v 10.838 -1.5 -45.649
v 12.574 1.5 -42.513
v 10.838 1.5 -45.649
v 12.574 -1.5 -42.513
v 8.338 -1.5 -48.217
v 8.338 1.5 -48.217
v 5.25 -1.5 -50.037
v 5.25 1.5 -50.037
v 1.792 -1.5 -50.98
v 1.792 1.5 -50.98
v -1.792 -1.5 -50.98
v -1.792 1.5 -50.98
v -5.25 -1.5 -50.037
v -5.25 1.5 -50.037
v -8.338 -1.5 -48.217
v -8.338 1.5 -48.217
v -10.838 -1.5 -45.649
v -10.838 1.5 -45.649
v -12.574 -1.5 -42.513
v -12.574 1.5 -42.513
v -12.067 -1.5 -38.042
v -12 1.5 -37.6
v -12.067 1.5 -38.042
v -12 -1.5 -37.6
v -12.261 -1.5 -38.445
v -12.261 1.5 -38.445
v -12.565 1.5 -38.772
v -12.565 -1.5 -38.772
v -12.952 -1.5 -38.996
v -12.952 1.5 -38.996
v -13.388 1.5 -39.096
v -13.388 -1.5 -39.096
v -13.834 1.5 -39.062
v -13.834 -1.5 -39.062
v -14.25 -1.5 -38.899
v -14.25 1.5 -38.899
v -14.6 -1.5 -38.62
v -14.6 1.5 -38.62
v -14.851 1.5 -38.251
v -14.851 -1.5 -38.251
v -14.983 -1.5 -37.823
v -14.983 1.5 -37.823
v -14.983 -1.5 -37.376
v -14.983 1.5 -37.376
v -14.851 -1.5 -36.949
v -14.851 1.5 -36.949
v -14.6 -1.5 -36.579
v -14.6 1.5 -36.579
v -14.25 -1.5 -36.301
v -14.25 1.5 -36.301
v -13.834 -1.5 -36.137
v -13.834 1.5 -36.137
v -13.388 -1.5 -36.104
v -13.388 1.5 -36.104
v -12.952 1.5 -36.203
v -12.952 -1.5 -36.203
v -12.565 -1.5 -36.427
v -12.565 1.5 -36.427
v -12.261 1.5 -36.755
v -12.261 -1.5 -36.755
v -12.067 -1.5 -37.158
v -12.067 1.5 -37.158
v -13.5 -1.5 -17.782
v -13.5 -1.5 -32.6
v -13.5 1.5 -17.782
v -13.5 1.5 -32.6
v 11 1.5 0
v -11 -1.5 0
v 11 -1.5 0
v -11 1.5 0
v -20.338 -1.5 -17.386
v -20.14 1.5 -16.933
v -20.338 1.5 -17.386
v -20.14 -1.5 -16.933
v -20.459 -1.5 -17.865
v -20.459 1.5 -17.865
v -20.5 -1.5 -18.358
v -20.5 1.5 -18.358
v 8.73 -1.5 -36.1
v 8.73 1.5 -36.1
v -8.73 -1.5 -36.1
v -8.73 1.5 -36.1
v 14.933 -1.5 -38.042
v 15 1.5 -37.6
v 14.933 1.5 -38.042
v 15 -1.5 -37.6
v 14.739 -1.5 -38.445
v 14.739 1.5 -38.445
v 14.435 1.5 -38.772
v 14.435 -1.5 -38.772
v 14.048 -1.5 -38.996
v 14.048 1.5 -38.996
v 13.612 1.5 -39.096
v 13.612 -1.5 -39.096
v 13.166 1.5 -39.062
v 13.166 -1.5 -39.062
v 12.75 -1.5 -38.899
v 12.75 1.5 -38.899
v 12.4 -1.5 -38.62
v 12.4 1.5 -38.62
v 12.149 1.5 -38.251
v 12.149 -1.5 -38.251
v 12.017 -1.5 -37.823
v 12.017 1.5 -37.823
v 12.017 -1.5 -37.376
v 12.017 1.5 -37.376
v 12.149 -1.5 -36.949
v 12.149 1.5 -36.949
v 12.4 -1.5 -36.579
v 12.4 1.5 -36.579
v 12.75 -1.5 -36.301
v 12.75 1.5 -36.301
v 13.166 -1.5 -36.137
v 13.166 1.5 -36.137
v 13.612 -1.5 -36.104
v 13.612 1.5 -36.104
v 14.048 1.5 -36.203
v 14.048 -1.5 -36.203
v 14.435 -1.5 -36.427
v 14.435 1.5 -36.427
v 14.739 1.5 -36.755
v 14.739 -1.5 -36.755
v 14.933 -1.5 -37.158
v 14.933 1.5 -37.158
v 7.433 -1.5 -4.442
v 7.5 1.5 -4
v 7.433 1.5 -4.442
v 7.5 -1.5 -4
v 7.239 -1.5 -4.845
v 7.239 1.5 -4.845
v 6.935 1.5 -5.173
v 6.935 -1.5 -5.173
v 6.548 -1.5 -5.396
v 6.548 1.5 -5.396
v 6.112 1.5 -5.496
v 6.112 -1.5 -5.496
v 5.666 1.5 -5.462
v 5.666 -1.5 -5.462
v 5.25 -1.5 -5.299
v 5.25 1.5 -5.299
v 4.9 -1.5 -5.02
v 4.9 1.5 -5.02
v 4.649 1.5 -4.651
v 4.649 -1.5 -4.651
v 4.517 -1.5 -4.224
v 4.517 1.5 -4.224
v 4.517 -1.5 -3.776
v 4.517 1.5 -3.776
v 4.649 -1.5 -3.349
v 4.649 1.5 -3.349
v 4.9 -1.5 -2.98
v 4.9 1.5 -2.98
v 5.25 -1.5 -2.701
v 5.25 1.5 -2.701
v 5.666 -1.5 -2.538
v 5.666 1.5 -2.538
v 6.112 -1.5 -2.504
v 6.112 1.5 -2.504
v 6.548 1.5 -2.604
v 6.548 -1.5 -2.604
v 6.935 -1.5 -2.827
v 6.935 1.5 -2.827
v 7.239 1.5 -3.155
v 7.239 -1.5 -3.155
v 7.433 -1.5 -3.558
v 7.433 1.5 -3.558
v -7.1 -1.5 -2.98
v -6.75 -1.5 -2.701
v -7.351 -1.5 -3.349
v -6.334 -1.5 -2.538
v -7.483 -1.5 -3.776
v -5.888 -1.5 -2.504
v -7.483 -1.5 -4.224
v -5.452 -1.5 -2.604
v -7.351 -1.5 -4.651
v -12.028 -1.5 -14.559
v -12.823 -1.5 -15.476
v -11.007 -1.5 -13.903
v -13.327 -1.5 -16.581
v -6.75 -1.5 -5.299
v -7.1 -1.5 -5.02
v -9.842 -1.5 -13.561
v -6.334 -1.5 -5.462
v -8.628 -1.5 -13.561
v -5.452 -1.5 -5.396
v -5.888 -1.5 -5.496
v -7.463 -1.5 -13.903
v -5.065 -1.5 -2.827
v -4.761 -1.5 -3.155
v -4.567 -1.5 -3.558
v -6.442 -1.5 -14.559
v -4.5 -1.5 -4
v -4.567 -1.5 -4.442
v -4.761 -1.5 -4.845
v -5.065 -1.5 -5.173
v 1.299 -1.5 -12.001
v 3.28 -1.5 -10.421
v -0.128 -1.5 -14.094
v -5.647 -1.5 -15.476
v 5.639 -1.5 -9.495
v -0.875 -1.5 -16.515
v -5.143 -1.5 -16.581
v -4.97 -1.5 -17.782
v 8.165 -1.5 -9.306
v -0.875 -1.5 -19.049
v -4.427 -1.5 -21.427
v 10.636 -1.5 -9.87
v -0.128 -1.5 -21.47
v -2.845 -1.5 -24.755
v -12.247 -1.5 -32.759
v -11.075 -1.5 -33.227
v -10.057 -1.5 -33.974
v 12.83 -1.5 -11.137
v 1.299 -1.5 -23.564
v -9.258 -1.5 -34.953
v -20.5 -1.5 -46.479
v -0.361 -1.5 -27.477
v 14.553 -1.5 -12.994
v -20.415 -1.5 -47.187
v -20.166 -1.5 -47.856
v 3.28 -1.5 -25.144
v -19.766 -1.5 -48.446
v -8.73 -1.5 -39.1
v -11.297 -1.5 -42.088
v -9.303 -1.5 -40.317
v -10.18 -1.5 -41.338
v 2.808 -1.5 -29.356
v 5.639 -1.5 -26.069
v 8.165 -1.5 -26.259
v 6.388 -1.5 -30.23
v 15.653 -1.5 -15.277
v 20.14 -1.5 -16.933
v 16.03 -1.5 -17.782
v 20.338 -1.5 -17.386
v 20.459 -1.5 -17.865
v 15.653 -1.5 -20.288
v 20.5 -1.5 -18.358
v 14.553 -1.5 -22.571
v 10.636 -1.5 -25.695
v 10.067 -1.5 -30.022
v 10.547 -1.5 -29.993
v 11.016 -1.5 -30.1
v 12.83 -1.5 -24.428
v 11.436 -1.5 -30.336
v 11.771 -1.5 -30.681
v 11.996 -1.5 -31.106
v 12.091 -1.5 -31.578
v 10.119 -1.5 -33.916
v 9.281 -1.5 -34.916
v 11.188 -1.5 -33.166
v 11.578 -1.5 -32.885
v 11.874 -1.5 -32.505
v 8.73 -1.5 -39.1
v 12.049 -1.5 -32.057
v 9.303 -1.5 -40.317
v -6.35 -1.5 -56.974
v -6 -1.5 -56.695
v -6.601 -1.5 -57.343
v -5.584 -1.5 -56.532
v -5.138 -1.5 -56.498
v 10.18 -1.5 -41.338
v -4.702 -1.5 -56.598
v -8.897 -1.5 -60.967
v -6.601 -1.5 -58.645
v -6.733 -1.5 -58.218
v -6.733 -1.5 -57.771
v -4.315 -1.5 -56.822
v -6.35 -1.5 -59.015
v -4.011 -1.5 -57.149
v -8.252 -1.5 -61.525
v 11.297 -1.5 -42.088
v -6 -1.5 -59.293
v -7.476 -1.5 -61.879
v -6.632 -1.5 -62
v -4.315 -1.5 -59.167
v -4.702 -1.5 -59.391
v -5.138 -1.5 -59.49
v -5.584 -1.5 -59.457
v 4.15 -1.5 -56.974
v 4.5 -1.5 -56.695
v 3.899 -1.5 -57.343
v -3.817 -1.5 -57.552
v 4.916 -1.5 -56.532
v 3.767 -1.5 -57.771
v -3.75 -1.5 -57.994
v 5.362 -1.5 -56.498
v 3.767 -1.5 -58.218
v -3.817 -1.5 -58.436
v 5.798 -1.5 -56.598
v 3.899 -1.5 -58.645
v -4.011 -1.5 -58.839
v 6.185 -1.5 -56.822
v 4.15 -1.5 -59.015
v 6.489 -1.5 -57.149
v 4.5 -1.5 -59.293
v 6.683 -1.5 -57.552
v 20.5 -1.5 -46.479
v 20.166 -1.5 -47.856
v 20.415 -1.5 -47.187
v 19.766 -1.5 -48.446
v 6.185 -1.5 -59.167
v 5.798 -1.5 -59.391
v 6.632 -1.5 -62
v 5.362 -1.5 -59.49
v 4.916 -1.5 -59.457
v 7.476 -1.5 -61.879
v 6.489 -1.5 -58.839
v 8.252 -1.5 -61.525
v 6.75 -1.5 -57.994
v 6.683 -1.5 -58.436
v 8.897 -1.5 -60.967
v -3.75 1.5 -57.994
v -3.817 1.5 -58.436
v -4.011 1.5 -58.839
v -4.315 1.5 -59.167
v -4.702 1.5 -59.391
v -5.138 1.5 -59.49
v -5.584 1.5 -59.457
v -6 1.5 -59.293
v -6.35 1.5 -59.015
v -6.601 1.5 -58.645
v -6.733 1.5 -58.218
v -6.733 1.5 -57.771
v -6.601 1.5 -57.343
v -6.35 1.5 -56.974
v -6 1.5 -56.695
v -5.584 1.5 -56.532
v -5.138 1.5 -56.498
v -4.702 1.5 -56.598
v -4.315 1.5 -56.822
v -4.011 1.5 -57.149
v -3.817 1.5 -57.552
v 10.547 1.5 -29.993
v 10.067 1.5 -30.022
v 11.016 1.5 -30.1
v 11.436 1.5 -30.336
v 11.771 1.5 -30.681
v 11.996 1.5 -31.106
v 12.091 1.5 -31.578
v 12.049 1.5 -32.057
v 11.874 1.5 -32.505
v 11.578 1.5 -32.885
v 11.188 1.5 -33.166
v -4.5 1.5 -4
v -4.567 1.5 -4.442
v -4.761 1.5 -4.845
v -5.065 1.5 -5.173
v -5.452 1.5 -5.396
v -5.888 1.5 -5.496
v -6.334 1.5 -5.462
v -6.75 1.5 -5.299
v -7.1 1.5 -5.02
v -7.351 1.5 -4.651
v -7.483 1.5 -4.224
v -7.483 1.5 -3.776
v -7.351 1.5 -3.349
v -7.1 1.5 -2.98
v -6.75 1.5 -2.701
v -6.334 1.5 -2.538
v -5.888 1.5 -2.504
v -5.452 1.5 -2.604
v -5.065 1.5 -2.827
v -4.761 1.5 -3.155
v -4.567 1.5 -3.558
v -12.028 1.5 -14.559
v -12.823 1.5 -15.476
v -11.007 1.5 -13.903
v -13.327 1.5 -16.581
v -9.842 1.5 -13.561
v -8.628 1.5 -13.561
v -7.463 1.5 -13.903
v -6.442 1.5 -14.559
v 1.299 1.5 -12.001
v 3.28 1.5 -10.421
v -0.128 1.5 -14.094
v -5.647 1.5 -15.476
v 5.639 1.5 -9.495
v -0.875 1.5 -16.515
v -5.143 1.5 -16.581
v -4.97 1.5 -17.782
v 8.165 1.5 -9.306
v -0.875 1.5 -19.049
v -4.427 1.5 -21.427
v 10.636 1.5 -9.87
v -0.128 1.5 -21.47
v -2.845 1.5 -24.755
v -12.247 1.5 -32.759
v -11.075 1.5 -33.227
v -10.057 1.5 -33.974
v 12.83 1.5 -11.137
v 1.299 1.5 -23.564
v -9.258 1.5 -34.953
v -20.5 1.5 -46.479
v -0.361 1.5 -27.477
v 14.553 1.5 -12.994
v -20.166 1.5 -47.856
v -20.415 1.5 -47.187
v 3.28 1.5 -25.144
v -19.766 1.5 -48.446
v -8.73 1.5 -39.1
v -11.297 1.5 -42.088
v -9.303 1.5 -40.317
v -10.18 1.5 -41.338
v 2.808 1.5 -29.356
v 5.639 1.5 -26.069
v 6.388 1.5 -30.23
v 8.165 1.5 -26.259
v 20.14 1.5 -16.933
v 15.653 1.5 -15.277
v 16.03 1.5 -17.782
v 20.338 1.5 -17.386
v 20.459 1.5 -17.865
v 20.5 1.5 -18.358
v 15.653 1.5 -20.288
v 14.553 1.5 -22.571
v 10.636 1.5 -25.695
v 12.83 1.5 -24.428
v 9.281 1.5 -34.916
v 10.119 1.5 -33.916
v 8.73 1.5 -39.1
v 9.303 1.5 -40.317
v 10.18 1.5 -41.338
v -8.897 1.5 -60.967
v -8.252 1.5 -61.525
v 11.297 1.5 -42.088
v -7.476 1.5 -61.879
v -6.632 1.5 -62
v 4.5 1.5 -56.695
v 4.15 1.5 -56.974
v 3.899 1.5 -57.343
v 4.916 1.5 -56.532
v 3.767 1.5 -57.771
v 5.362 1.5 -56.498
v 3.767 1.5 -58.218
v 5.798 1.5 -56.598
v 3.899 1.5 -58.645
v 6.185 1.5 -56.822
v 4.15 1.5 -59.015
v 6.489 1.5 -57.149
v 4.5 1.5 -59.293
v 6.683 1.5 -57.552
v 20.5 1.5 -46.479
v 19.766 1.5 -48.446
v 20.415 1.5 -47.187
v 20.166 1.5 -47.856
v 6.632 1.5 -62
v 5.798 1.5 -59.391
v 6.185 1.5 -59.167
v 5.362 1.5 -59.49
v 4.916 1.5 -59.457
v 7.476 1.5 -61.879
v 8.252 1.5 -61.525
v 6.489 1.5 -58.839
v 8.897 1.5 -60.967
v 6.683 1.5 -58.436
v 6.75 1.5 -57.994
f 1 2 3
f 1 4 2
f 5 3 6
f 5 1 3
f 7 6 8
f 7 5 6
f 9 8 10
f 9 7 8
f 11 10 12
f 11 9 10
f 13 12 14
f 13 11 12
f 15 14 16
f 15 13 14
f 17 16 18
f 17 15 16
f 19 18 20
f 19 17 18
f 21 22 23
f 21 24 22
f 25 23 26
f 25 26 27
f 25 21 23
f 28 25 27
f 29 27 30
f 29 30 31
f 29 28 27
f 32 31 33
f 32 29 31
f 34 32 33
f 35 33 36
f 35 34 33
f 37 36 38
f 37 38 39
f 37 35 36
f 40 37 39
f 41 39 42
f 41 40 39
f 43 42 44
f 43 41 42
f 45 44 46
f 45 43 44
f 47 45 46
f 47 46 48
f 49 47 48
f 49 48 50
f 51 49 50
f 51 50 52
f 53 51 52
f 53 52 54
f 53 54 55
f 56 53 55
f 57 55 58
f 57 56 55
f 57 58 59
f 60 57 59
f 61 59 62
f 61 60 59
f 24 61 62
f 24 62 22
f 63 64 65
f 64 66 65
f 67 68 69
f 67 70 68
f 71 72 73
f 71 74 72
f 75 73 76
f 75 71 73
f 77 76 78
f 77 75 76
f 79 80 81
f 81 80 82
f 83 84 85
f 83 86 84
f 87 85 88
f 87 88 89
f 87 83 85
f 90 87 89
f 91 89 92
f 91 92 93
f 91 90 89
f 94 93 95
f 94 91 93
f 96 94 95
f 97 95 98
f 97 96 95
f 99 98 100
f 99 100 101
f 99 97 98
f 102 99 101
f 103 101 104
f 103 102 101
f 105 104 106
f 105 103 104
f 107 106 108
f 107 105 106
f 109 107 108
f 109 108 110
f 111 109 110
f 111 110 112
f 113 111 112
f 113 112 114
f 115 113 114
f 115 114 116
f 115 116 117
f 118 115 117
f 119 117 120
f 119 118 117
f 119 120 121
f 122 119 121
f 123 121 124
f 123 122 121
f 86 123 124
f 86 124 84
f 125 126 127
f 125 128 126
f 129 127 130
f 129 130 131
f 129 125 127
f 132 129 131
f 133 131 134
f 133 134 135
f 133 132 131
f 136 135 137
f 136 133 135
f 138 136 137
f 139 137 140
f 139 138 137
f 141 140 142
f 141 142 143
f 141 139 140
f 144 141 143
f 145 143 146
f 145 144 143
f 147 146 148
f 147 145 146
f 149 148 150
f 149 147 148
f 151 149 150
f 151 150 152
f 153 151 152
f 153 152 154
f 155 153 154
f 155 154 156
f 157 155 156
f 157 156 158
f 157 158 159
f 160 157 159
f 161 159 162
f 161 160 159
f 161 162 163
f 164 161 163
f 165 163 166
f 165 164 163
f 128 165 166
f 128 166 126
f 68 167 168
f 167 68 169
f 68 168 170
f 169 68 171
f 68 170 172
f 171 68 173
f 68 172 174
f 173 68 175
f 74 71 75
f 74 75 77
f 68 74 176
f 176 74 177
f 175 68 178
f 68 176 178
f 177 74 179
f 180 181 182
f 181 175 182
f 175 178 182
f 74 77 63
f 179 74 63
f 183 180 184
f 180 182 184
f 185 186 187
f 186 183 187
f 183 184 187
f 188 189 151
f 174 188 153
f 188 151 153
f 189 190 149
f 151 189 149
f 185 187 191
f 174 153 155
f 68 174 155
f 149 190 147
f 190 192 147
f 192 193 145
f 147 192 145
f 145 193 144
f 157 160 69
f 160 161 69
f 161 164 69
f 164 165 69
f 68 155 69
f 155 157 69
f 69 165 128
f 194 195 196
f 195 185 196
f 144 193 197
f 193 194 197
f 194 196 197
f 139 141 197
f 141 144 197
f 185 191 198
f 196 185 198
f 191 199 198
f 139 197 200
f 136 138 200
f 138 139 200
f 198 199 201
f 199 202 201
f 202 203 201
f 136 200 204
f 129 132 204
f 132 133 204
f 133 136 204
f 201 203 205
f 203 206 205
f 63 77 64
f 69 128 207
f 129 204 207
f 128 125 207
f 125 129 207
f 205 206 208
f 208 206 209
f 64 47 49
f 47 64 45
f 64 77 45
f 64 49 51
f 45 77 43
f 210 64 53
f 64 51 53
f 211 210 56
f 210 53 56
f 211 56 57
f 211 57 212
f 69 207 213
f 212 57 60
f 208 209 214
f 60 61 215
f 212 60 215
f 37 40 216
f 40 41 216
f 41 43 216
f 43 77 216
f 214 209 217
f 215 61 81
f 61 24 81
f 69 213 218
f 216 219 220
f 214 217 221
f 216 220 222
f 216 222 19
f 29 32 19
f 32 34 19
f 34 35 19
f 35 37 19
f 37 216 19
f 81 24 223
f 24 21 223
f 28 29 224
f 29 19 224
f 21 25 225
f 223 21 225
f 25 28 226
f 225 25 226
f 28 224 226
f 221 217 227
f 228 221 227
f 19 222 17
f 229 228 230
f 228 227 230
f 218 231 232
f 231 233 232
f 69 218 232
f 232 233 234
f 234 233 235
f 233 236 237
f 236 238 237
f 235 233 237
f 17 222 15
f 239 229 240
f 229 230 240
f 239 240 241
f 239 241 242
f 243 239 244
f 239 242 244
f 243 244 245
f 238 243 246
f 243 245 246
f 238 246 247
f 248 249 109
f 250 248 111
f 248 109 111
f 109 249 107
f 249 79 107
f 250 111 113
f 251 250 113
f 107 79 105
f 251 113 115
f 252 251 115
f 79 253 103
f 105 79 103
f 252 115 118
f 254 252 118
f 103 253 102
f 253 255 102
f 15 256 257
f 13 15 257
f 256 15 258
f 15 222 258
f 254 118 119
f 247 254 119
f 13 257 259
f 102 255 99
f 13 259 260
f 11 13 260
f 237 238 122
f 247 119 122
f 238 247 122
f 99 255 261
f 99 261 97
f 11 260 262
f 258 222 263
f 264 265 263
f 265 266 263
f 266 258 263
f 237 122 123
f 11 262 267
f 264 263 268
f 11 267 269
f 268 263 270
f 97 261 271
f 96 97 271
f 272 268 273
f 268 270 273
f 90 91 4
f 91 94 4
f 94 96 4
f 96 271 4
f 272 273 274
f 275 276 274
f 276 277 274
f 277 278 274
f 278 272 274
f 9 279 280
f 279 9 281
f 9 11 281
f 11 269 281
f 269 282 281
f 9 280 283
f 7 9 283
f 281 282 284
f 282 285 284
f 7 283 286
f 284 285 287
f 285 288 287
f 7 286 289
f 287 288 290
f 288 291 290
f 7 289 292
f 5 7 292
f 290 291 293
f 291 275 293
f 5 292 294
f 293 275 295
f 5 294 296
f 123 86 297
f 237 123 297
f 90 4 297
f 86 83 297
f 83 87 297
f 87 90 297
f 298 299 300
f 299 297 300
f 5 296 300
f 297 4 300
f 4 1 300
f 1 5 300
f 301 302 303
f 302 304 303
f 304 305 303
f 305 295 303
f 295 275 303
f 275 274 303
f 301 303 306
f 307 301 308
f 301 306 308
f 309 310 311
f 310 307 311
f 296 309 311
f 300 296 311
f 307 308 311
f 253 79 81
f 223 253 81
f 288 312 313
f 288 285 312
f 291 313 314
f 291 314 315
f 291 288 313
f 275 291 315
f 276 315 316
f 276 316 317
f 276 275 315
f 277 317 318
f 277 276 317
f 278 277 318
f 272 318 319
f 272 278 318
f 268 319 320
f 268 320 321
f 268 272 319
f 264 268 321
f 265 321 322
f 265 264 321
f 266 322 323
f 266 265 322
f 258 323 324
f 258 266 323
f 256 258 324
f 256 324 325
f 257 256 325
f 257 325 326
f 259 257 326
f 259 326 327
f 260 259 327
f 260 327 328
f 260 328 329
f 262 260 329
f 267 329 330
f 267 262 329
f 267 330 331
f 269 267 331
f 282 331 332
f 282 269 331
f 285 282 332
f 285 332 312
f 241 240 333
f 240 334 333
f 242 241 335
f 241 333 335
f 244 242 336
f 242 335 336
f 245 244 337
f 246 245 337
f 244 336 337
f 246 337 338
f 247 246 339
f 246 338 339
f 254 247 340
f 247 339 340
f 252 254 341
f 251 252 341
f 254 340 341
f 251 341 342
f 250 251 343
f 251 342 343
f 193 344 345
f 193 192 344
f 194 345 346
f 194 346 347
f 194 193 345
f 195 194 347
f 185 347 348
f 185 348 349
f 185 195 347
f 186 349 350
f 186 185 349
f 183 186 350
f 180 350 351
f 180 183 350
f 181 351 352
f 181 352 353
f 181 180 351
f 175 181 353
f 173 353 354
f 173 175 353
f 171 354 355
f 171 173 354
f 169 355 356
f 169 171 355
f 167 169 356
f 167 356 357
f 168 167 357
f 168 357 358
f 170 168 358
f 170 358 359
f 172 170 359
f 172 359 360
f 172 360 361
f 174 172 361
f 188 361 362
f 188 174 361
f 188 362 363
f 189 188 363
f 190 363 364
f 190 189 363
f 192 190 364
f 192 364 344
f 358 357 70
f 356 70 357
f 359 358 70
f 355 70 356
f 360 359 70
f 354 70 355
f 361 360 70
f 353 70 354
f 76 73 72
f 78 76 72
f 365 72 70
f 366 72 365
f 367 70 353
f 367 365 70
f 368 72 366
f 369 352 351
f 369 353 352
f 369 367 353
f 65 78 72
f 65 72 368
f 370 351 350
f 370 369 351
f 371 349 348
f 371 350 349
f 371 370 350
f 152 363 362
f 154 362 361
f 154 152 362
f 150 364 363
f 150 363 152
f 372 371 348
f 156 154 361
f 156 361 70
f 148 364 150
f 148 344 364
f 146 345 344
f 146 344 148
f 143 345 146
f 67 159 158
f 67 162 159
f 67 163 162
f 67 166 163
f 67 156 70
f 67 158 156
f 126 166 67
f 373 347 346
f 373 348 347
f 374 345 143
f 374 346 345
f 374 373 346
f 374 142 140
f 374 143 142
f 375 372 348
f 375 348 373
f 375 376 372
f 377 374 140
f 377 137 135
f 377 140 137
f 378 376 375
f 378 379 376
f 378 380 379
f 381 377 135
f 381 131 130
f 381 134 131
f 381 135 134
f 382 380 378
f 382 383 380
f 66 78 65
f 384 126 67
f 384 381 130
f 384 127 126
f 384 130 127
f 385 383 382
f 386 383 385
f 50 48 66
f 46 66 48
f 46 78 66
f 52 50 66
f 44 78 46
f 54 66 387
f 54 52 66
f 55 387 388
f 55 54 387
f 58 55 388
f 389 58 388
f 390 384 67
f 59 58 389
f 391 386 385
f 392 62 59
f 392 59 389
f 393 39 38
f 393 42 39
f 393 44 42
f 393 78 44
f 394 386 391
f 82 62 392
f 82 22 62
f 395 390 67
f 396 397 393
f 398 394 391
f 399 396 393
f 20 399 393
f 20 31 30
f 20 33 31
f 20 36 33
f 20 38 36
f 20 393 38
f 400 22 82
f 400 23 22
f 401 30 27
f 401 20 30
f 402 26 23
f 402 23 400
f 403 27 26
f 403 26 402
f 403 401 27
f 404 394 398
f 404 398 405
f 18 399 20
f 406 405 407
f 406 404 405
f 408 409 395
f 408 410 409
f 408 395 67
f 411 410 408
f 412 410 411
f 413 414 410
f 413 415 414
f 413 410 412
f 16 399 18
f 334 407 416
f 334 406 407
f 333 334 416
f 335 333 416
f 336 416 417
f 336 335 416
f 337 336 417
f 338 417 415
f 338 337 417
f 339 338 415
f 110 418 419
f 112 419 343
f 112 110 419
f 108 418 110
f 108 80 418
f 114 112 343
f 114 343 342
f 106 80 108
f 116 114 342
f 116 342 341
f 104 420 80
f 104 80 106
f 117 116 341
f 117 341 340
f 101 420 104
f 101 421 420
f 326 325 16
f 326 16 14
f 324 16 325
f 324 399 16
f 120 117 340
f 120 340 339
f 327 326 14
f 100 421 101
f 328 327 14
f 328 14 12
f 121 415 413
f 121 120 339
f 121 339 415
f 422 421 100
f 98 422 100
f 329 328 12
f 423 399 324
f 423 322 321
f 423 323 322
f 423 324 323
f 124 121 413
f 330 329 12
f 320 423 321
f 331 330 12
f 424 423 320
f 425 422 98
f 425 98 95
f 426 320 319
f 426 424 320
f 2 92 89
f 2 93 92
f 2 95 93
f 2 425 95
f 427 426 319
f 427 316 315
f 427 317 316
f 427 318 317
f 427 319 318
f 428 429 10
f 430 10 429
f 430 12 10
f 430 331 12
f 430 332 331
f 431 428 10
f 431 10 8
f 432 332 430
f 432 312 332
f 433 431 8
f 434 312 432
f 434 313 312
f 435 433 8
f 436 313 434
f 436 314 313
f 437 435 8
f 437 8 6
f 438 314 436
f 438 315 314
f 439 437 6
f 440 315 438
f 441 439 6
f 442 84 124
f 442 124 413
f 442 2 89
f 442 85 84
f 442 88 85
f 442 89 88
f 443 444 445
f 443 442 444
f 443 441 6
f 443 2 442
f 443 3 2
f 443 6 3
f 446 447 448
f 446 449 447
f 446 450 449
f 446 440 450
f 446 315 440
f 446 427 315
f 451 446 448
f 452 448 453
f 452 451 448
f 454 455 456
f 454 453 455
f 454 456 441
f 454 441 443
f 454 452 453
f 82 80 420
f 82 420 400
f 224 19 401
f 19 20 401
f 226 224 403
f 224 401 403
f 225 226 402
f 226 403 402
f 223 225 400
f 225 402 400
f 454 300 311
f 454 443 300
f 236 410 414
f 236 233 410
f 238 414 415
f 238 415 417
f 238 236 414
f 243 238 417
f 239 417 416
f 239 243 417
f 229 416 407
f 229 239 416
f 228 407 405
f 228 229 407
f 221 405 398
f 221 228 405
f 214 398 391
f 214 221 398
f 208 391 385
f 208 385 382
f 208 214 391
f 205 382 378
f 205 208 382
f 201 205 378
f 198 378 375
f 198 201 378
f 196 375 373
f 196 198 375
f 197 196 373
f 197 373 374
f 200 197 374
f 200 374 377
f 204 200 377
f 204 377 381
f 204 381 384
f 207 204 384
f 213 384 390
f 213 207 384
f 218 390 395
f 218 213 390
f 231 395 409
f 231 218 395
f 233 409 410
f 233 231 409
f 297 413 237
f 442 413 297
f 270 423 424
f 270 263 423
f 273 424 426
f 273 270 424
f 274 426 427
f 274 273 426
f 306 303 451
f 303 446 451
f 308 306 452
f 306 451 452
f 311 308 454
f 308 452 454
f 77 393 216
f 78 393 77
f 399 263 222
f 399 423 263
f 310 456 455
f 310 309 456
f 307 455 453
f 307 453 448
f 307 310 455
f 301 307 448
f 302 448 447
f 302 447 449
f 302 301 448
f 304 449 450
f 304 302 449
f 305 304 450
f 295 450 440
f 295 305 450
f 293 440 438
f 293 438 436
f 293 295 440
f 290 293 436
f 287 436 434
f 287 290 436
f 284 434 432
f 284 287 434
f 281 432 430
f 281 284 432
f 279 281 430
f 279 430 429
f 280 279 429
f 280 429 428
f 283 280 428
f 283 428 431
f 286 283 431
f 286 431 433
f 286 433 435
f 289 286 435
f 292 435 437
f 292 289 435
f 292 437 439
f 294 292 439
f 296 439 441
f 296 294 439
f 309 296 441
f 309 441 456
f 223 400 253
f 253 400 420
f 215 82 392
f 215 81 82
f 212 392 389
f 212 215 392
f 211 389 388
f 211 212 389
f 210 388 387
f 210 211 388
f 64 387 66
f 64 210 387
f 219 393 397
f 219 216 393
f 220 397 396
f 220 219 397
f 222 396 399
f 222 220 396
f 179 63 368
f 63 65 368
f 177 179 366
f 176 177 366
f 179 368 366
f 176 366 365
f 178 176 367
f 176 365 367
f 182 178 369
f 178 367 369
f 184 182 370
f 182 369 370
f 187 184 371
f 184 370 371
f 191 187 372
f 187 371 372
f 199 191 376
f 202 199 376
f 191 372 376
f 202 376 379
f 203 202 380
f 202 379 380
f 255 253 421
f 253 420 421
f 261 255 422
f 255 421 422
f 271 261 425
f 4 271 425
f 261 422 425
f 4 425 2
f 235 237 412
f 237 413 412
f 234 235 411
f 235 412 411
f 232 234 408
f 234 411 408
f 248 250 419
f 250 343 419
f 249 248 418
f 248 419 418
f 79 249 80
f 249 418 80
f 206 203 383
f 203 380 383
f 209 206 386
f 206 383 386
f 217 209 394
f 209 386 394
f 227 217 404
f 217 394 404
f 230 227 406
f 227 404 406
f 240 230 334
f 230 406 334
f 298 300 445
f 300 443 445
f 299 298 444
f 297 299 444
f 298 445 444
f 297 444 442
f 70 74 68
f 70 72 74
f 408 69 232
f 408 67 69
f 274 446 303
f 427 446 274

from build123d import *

# Parameters (mm, degrees)
CROQUIS1_R              = 8.5
CROQUIS1_R_2            = 1.5
SALIENTE_EXTRUIR1_DEPTH = 1.5
REDONDEO1_R             = 3


with BuildPart() as part:
    # Croquis1 → Saliente-Extruir1 (new body, symmetric)
    with BuildSketch(Plane(origin=(0, 0, 0), x_dir=(1, 0, 0), z_dir=(0, 1, 0))):
        Polygon((-11, 0), (11, 0), (20.5, 17.599715907), (20.5, 47.599715907), (8, 62), (-8, 62), (-20.5, 47.599715907), (-20.5, 17.599715907), align=None)
        with Locations((7.530163354, 17.782301135)):
            Circle(CROQUIS1_R, mode=Mode.SUBTRACT)
        with Locations((-5.25, 57.994261746)):
            Circle(CROQUIS1_R_2, mode=Mode.SUBTRACT)
        with Locations((-13.5, 37.599715907)):
            Circle(CROQUIS1_R_2, mode=Mode.SUBTRACT)
        with Locations((13.5, 37.599715907)):
            Circle(CROQUIS1_R_2, mode=Mode.SUBTRACT)
        with Locations((5.25, 57.994261746)):
            Circle(CROQUIS1_R_2, mode=Mode.SUBTRACT)
        with Locations((-6, 4)):
            Circle(CROQUIS1_R_2, mode=Mode.SUBTRACT)
        with Locations((6, 4)):
            Circle(CROQUIS1_R_2, mode=Mode.SUBTRACT)
        with BuildLine():
            Line((-8.730303993, 39.099715907), (8.730303993, 39.099715907))
            ThreePointArc((8.730303993, 39.099715907), (10.179901517, 41.338291312), (12.574074074, 42.513234115))
            ThreePointArc((12.574074074, 42.513234115), (0, 51.099715907), (-12.574074074, 42.513234115))
            ThreePointArc((-12.574074074, 42.513234115), (-10.179901517, 41.338291312), (-8.730303993, 39.099715907))
        make_face(mode=Mode.SUBTRACT)
        with BuildLine():
            Line((-13.5, 32.599715907), (-13.5, 17.782301135))
            ThreePointArc((-13.5, 17.782301135), (-9.234918323, 13.517219458), (-4.969836646, 17.782301135))
            ThreePointArc((-4.969836646, 17.782301135), (-0.361028795, 27.476582257), (10.06681719, 30.022210747))
            ThreePointArc((10.06681719, 30.022210747), (11.99598649, 31.106273213), (11.187975781, 33.166371344))
            ThreePointArc((11.187975781, 33.166371344), (9.667400631, 34.388612969), (8.730303993, 36.099715907))
            Line((8.730303993, 36.099715907), (-8.730303993, 36.099715907))
            ThreePointArc((-8.730303993, 36.099715907), (-10.541960108, 33.568587033), (-13.5, 32.599715907))
        make_face(mode=Mode.SUBTRACT)
    extrude(amount=SALIENTE_EXTRUIR1_DEPTH, both=True)

    # Redondeo1
    redondeo1_edges = [part.edges().sort_by_distance(p)[0] for p in [
        (-20.5, 0, -17.599715907),
        (-20.5, 0, -47.599715907),
        (-8, 0, -62),
        (8, 0, -62),
        (20.5, 0, -47.599715907),
        (20.5, 0, -17.599715907),
    ]]
    fillet(redondeo1_edges, radius=REDONDEO1_R)


solid = part.part
